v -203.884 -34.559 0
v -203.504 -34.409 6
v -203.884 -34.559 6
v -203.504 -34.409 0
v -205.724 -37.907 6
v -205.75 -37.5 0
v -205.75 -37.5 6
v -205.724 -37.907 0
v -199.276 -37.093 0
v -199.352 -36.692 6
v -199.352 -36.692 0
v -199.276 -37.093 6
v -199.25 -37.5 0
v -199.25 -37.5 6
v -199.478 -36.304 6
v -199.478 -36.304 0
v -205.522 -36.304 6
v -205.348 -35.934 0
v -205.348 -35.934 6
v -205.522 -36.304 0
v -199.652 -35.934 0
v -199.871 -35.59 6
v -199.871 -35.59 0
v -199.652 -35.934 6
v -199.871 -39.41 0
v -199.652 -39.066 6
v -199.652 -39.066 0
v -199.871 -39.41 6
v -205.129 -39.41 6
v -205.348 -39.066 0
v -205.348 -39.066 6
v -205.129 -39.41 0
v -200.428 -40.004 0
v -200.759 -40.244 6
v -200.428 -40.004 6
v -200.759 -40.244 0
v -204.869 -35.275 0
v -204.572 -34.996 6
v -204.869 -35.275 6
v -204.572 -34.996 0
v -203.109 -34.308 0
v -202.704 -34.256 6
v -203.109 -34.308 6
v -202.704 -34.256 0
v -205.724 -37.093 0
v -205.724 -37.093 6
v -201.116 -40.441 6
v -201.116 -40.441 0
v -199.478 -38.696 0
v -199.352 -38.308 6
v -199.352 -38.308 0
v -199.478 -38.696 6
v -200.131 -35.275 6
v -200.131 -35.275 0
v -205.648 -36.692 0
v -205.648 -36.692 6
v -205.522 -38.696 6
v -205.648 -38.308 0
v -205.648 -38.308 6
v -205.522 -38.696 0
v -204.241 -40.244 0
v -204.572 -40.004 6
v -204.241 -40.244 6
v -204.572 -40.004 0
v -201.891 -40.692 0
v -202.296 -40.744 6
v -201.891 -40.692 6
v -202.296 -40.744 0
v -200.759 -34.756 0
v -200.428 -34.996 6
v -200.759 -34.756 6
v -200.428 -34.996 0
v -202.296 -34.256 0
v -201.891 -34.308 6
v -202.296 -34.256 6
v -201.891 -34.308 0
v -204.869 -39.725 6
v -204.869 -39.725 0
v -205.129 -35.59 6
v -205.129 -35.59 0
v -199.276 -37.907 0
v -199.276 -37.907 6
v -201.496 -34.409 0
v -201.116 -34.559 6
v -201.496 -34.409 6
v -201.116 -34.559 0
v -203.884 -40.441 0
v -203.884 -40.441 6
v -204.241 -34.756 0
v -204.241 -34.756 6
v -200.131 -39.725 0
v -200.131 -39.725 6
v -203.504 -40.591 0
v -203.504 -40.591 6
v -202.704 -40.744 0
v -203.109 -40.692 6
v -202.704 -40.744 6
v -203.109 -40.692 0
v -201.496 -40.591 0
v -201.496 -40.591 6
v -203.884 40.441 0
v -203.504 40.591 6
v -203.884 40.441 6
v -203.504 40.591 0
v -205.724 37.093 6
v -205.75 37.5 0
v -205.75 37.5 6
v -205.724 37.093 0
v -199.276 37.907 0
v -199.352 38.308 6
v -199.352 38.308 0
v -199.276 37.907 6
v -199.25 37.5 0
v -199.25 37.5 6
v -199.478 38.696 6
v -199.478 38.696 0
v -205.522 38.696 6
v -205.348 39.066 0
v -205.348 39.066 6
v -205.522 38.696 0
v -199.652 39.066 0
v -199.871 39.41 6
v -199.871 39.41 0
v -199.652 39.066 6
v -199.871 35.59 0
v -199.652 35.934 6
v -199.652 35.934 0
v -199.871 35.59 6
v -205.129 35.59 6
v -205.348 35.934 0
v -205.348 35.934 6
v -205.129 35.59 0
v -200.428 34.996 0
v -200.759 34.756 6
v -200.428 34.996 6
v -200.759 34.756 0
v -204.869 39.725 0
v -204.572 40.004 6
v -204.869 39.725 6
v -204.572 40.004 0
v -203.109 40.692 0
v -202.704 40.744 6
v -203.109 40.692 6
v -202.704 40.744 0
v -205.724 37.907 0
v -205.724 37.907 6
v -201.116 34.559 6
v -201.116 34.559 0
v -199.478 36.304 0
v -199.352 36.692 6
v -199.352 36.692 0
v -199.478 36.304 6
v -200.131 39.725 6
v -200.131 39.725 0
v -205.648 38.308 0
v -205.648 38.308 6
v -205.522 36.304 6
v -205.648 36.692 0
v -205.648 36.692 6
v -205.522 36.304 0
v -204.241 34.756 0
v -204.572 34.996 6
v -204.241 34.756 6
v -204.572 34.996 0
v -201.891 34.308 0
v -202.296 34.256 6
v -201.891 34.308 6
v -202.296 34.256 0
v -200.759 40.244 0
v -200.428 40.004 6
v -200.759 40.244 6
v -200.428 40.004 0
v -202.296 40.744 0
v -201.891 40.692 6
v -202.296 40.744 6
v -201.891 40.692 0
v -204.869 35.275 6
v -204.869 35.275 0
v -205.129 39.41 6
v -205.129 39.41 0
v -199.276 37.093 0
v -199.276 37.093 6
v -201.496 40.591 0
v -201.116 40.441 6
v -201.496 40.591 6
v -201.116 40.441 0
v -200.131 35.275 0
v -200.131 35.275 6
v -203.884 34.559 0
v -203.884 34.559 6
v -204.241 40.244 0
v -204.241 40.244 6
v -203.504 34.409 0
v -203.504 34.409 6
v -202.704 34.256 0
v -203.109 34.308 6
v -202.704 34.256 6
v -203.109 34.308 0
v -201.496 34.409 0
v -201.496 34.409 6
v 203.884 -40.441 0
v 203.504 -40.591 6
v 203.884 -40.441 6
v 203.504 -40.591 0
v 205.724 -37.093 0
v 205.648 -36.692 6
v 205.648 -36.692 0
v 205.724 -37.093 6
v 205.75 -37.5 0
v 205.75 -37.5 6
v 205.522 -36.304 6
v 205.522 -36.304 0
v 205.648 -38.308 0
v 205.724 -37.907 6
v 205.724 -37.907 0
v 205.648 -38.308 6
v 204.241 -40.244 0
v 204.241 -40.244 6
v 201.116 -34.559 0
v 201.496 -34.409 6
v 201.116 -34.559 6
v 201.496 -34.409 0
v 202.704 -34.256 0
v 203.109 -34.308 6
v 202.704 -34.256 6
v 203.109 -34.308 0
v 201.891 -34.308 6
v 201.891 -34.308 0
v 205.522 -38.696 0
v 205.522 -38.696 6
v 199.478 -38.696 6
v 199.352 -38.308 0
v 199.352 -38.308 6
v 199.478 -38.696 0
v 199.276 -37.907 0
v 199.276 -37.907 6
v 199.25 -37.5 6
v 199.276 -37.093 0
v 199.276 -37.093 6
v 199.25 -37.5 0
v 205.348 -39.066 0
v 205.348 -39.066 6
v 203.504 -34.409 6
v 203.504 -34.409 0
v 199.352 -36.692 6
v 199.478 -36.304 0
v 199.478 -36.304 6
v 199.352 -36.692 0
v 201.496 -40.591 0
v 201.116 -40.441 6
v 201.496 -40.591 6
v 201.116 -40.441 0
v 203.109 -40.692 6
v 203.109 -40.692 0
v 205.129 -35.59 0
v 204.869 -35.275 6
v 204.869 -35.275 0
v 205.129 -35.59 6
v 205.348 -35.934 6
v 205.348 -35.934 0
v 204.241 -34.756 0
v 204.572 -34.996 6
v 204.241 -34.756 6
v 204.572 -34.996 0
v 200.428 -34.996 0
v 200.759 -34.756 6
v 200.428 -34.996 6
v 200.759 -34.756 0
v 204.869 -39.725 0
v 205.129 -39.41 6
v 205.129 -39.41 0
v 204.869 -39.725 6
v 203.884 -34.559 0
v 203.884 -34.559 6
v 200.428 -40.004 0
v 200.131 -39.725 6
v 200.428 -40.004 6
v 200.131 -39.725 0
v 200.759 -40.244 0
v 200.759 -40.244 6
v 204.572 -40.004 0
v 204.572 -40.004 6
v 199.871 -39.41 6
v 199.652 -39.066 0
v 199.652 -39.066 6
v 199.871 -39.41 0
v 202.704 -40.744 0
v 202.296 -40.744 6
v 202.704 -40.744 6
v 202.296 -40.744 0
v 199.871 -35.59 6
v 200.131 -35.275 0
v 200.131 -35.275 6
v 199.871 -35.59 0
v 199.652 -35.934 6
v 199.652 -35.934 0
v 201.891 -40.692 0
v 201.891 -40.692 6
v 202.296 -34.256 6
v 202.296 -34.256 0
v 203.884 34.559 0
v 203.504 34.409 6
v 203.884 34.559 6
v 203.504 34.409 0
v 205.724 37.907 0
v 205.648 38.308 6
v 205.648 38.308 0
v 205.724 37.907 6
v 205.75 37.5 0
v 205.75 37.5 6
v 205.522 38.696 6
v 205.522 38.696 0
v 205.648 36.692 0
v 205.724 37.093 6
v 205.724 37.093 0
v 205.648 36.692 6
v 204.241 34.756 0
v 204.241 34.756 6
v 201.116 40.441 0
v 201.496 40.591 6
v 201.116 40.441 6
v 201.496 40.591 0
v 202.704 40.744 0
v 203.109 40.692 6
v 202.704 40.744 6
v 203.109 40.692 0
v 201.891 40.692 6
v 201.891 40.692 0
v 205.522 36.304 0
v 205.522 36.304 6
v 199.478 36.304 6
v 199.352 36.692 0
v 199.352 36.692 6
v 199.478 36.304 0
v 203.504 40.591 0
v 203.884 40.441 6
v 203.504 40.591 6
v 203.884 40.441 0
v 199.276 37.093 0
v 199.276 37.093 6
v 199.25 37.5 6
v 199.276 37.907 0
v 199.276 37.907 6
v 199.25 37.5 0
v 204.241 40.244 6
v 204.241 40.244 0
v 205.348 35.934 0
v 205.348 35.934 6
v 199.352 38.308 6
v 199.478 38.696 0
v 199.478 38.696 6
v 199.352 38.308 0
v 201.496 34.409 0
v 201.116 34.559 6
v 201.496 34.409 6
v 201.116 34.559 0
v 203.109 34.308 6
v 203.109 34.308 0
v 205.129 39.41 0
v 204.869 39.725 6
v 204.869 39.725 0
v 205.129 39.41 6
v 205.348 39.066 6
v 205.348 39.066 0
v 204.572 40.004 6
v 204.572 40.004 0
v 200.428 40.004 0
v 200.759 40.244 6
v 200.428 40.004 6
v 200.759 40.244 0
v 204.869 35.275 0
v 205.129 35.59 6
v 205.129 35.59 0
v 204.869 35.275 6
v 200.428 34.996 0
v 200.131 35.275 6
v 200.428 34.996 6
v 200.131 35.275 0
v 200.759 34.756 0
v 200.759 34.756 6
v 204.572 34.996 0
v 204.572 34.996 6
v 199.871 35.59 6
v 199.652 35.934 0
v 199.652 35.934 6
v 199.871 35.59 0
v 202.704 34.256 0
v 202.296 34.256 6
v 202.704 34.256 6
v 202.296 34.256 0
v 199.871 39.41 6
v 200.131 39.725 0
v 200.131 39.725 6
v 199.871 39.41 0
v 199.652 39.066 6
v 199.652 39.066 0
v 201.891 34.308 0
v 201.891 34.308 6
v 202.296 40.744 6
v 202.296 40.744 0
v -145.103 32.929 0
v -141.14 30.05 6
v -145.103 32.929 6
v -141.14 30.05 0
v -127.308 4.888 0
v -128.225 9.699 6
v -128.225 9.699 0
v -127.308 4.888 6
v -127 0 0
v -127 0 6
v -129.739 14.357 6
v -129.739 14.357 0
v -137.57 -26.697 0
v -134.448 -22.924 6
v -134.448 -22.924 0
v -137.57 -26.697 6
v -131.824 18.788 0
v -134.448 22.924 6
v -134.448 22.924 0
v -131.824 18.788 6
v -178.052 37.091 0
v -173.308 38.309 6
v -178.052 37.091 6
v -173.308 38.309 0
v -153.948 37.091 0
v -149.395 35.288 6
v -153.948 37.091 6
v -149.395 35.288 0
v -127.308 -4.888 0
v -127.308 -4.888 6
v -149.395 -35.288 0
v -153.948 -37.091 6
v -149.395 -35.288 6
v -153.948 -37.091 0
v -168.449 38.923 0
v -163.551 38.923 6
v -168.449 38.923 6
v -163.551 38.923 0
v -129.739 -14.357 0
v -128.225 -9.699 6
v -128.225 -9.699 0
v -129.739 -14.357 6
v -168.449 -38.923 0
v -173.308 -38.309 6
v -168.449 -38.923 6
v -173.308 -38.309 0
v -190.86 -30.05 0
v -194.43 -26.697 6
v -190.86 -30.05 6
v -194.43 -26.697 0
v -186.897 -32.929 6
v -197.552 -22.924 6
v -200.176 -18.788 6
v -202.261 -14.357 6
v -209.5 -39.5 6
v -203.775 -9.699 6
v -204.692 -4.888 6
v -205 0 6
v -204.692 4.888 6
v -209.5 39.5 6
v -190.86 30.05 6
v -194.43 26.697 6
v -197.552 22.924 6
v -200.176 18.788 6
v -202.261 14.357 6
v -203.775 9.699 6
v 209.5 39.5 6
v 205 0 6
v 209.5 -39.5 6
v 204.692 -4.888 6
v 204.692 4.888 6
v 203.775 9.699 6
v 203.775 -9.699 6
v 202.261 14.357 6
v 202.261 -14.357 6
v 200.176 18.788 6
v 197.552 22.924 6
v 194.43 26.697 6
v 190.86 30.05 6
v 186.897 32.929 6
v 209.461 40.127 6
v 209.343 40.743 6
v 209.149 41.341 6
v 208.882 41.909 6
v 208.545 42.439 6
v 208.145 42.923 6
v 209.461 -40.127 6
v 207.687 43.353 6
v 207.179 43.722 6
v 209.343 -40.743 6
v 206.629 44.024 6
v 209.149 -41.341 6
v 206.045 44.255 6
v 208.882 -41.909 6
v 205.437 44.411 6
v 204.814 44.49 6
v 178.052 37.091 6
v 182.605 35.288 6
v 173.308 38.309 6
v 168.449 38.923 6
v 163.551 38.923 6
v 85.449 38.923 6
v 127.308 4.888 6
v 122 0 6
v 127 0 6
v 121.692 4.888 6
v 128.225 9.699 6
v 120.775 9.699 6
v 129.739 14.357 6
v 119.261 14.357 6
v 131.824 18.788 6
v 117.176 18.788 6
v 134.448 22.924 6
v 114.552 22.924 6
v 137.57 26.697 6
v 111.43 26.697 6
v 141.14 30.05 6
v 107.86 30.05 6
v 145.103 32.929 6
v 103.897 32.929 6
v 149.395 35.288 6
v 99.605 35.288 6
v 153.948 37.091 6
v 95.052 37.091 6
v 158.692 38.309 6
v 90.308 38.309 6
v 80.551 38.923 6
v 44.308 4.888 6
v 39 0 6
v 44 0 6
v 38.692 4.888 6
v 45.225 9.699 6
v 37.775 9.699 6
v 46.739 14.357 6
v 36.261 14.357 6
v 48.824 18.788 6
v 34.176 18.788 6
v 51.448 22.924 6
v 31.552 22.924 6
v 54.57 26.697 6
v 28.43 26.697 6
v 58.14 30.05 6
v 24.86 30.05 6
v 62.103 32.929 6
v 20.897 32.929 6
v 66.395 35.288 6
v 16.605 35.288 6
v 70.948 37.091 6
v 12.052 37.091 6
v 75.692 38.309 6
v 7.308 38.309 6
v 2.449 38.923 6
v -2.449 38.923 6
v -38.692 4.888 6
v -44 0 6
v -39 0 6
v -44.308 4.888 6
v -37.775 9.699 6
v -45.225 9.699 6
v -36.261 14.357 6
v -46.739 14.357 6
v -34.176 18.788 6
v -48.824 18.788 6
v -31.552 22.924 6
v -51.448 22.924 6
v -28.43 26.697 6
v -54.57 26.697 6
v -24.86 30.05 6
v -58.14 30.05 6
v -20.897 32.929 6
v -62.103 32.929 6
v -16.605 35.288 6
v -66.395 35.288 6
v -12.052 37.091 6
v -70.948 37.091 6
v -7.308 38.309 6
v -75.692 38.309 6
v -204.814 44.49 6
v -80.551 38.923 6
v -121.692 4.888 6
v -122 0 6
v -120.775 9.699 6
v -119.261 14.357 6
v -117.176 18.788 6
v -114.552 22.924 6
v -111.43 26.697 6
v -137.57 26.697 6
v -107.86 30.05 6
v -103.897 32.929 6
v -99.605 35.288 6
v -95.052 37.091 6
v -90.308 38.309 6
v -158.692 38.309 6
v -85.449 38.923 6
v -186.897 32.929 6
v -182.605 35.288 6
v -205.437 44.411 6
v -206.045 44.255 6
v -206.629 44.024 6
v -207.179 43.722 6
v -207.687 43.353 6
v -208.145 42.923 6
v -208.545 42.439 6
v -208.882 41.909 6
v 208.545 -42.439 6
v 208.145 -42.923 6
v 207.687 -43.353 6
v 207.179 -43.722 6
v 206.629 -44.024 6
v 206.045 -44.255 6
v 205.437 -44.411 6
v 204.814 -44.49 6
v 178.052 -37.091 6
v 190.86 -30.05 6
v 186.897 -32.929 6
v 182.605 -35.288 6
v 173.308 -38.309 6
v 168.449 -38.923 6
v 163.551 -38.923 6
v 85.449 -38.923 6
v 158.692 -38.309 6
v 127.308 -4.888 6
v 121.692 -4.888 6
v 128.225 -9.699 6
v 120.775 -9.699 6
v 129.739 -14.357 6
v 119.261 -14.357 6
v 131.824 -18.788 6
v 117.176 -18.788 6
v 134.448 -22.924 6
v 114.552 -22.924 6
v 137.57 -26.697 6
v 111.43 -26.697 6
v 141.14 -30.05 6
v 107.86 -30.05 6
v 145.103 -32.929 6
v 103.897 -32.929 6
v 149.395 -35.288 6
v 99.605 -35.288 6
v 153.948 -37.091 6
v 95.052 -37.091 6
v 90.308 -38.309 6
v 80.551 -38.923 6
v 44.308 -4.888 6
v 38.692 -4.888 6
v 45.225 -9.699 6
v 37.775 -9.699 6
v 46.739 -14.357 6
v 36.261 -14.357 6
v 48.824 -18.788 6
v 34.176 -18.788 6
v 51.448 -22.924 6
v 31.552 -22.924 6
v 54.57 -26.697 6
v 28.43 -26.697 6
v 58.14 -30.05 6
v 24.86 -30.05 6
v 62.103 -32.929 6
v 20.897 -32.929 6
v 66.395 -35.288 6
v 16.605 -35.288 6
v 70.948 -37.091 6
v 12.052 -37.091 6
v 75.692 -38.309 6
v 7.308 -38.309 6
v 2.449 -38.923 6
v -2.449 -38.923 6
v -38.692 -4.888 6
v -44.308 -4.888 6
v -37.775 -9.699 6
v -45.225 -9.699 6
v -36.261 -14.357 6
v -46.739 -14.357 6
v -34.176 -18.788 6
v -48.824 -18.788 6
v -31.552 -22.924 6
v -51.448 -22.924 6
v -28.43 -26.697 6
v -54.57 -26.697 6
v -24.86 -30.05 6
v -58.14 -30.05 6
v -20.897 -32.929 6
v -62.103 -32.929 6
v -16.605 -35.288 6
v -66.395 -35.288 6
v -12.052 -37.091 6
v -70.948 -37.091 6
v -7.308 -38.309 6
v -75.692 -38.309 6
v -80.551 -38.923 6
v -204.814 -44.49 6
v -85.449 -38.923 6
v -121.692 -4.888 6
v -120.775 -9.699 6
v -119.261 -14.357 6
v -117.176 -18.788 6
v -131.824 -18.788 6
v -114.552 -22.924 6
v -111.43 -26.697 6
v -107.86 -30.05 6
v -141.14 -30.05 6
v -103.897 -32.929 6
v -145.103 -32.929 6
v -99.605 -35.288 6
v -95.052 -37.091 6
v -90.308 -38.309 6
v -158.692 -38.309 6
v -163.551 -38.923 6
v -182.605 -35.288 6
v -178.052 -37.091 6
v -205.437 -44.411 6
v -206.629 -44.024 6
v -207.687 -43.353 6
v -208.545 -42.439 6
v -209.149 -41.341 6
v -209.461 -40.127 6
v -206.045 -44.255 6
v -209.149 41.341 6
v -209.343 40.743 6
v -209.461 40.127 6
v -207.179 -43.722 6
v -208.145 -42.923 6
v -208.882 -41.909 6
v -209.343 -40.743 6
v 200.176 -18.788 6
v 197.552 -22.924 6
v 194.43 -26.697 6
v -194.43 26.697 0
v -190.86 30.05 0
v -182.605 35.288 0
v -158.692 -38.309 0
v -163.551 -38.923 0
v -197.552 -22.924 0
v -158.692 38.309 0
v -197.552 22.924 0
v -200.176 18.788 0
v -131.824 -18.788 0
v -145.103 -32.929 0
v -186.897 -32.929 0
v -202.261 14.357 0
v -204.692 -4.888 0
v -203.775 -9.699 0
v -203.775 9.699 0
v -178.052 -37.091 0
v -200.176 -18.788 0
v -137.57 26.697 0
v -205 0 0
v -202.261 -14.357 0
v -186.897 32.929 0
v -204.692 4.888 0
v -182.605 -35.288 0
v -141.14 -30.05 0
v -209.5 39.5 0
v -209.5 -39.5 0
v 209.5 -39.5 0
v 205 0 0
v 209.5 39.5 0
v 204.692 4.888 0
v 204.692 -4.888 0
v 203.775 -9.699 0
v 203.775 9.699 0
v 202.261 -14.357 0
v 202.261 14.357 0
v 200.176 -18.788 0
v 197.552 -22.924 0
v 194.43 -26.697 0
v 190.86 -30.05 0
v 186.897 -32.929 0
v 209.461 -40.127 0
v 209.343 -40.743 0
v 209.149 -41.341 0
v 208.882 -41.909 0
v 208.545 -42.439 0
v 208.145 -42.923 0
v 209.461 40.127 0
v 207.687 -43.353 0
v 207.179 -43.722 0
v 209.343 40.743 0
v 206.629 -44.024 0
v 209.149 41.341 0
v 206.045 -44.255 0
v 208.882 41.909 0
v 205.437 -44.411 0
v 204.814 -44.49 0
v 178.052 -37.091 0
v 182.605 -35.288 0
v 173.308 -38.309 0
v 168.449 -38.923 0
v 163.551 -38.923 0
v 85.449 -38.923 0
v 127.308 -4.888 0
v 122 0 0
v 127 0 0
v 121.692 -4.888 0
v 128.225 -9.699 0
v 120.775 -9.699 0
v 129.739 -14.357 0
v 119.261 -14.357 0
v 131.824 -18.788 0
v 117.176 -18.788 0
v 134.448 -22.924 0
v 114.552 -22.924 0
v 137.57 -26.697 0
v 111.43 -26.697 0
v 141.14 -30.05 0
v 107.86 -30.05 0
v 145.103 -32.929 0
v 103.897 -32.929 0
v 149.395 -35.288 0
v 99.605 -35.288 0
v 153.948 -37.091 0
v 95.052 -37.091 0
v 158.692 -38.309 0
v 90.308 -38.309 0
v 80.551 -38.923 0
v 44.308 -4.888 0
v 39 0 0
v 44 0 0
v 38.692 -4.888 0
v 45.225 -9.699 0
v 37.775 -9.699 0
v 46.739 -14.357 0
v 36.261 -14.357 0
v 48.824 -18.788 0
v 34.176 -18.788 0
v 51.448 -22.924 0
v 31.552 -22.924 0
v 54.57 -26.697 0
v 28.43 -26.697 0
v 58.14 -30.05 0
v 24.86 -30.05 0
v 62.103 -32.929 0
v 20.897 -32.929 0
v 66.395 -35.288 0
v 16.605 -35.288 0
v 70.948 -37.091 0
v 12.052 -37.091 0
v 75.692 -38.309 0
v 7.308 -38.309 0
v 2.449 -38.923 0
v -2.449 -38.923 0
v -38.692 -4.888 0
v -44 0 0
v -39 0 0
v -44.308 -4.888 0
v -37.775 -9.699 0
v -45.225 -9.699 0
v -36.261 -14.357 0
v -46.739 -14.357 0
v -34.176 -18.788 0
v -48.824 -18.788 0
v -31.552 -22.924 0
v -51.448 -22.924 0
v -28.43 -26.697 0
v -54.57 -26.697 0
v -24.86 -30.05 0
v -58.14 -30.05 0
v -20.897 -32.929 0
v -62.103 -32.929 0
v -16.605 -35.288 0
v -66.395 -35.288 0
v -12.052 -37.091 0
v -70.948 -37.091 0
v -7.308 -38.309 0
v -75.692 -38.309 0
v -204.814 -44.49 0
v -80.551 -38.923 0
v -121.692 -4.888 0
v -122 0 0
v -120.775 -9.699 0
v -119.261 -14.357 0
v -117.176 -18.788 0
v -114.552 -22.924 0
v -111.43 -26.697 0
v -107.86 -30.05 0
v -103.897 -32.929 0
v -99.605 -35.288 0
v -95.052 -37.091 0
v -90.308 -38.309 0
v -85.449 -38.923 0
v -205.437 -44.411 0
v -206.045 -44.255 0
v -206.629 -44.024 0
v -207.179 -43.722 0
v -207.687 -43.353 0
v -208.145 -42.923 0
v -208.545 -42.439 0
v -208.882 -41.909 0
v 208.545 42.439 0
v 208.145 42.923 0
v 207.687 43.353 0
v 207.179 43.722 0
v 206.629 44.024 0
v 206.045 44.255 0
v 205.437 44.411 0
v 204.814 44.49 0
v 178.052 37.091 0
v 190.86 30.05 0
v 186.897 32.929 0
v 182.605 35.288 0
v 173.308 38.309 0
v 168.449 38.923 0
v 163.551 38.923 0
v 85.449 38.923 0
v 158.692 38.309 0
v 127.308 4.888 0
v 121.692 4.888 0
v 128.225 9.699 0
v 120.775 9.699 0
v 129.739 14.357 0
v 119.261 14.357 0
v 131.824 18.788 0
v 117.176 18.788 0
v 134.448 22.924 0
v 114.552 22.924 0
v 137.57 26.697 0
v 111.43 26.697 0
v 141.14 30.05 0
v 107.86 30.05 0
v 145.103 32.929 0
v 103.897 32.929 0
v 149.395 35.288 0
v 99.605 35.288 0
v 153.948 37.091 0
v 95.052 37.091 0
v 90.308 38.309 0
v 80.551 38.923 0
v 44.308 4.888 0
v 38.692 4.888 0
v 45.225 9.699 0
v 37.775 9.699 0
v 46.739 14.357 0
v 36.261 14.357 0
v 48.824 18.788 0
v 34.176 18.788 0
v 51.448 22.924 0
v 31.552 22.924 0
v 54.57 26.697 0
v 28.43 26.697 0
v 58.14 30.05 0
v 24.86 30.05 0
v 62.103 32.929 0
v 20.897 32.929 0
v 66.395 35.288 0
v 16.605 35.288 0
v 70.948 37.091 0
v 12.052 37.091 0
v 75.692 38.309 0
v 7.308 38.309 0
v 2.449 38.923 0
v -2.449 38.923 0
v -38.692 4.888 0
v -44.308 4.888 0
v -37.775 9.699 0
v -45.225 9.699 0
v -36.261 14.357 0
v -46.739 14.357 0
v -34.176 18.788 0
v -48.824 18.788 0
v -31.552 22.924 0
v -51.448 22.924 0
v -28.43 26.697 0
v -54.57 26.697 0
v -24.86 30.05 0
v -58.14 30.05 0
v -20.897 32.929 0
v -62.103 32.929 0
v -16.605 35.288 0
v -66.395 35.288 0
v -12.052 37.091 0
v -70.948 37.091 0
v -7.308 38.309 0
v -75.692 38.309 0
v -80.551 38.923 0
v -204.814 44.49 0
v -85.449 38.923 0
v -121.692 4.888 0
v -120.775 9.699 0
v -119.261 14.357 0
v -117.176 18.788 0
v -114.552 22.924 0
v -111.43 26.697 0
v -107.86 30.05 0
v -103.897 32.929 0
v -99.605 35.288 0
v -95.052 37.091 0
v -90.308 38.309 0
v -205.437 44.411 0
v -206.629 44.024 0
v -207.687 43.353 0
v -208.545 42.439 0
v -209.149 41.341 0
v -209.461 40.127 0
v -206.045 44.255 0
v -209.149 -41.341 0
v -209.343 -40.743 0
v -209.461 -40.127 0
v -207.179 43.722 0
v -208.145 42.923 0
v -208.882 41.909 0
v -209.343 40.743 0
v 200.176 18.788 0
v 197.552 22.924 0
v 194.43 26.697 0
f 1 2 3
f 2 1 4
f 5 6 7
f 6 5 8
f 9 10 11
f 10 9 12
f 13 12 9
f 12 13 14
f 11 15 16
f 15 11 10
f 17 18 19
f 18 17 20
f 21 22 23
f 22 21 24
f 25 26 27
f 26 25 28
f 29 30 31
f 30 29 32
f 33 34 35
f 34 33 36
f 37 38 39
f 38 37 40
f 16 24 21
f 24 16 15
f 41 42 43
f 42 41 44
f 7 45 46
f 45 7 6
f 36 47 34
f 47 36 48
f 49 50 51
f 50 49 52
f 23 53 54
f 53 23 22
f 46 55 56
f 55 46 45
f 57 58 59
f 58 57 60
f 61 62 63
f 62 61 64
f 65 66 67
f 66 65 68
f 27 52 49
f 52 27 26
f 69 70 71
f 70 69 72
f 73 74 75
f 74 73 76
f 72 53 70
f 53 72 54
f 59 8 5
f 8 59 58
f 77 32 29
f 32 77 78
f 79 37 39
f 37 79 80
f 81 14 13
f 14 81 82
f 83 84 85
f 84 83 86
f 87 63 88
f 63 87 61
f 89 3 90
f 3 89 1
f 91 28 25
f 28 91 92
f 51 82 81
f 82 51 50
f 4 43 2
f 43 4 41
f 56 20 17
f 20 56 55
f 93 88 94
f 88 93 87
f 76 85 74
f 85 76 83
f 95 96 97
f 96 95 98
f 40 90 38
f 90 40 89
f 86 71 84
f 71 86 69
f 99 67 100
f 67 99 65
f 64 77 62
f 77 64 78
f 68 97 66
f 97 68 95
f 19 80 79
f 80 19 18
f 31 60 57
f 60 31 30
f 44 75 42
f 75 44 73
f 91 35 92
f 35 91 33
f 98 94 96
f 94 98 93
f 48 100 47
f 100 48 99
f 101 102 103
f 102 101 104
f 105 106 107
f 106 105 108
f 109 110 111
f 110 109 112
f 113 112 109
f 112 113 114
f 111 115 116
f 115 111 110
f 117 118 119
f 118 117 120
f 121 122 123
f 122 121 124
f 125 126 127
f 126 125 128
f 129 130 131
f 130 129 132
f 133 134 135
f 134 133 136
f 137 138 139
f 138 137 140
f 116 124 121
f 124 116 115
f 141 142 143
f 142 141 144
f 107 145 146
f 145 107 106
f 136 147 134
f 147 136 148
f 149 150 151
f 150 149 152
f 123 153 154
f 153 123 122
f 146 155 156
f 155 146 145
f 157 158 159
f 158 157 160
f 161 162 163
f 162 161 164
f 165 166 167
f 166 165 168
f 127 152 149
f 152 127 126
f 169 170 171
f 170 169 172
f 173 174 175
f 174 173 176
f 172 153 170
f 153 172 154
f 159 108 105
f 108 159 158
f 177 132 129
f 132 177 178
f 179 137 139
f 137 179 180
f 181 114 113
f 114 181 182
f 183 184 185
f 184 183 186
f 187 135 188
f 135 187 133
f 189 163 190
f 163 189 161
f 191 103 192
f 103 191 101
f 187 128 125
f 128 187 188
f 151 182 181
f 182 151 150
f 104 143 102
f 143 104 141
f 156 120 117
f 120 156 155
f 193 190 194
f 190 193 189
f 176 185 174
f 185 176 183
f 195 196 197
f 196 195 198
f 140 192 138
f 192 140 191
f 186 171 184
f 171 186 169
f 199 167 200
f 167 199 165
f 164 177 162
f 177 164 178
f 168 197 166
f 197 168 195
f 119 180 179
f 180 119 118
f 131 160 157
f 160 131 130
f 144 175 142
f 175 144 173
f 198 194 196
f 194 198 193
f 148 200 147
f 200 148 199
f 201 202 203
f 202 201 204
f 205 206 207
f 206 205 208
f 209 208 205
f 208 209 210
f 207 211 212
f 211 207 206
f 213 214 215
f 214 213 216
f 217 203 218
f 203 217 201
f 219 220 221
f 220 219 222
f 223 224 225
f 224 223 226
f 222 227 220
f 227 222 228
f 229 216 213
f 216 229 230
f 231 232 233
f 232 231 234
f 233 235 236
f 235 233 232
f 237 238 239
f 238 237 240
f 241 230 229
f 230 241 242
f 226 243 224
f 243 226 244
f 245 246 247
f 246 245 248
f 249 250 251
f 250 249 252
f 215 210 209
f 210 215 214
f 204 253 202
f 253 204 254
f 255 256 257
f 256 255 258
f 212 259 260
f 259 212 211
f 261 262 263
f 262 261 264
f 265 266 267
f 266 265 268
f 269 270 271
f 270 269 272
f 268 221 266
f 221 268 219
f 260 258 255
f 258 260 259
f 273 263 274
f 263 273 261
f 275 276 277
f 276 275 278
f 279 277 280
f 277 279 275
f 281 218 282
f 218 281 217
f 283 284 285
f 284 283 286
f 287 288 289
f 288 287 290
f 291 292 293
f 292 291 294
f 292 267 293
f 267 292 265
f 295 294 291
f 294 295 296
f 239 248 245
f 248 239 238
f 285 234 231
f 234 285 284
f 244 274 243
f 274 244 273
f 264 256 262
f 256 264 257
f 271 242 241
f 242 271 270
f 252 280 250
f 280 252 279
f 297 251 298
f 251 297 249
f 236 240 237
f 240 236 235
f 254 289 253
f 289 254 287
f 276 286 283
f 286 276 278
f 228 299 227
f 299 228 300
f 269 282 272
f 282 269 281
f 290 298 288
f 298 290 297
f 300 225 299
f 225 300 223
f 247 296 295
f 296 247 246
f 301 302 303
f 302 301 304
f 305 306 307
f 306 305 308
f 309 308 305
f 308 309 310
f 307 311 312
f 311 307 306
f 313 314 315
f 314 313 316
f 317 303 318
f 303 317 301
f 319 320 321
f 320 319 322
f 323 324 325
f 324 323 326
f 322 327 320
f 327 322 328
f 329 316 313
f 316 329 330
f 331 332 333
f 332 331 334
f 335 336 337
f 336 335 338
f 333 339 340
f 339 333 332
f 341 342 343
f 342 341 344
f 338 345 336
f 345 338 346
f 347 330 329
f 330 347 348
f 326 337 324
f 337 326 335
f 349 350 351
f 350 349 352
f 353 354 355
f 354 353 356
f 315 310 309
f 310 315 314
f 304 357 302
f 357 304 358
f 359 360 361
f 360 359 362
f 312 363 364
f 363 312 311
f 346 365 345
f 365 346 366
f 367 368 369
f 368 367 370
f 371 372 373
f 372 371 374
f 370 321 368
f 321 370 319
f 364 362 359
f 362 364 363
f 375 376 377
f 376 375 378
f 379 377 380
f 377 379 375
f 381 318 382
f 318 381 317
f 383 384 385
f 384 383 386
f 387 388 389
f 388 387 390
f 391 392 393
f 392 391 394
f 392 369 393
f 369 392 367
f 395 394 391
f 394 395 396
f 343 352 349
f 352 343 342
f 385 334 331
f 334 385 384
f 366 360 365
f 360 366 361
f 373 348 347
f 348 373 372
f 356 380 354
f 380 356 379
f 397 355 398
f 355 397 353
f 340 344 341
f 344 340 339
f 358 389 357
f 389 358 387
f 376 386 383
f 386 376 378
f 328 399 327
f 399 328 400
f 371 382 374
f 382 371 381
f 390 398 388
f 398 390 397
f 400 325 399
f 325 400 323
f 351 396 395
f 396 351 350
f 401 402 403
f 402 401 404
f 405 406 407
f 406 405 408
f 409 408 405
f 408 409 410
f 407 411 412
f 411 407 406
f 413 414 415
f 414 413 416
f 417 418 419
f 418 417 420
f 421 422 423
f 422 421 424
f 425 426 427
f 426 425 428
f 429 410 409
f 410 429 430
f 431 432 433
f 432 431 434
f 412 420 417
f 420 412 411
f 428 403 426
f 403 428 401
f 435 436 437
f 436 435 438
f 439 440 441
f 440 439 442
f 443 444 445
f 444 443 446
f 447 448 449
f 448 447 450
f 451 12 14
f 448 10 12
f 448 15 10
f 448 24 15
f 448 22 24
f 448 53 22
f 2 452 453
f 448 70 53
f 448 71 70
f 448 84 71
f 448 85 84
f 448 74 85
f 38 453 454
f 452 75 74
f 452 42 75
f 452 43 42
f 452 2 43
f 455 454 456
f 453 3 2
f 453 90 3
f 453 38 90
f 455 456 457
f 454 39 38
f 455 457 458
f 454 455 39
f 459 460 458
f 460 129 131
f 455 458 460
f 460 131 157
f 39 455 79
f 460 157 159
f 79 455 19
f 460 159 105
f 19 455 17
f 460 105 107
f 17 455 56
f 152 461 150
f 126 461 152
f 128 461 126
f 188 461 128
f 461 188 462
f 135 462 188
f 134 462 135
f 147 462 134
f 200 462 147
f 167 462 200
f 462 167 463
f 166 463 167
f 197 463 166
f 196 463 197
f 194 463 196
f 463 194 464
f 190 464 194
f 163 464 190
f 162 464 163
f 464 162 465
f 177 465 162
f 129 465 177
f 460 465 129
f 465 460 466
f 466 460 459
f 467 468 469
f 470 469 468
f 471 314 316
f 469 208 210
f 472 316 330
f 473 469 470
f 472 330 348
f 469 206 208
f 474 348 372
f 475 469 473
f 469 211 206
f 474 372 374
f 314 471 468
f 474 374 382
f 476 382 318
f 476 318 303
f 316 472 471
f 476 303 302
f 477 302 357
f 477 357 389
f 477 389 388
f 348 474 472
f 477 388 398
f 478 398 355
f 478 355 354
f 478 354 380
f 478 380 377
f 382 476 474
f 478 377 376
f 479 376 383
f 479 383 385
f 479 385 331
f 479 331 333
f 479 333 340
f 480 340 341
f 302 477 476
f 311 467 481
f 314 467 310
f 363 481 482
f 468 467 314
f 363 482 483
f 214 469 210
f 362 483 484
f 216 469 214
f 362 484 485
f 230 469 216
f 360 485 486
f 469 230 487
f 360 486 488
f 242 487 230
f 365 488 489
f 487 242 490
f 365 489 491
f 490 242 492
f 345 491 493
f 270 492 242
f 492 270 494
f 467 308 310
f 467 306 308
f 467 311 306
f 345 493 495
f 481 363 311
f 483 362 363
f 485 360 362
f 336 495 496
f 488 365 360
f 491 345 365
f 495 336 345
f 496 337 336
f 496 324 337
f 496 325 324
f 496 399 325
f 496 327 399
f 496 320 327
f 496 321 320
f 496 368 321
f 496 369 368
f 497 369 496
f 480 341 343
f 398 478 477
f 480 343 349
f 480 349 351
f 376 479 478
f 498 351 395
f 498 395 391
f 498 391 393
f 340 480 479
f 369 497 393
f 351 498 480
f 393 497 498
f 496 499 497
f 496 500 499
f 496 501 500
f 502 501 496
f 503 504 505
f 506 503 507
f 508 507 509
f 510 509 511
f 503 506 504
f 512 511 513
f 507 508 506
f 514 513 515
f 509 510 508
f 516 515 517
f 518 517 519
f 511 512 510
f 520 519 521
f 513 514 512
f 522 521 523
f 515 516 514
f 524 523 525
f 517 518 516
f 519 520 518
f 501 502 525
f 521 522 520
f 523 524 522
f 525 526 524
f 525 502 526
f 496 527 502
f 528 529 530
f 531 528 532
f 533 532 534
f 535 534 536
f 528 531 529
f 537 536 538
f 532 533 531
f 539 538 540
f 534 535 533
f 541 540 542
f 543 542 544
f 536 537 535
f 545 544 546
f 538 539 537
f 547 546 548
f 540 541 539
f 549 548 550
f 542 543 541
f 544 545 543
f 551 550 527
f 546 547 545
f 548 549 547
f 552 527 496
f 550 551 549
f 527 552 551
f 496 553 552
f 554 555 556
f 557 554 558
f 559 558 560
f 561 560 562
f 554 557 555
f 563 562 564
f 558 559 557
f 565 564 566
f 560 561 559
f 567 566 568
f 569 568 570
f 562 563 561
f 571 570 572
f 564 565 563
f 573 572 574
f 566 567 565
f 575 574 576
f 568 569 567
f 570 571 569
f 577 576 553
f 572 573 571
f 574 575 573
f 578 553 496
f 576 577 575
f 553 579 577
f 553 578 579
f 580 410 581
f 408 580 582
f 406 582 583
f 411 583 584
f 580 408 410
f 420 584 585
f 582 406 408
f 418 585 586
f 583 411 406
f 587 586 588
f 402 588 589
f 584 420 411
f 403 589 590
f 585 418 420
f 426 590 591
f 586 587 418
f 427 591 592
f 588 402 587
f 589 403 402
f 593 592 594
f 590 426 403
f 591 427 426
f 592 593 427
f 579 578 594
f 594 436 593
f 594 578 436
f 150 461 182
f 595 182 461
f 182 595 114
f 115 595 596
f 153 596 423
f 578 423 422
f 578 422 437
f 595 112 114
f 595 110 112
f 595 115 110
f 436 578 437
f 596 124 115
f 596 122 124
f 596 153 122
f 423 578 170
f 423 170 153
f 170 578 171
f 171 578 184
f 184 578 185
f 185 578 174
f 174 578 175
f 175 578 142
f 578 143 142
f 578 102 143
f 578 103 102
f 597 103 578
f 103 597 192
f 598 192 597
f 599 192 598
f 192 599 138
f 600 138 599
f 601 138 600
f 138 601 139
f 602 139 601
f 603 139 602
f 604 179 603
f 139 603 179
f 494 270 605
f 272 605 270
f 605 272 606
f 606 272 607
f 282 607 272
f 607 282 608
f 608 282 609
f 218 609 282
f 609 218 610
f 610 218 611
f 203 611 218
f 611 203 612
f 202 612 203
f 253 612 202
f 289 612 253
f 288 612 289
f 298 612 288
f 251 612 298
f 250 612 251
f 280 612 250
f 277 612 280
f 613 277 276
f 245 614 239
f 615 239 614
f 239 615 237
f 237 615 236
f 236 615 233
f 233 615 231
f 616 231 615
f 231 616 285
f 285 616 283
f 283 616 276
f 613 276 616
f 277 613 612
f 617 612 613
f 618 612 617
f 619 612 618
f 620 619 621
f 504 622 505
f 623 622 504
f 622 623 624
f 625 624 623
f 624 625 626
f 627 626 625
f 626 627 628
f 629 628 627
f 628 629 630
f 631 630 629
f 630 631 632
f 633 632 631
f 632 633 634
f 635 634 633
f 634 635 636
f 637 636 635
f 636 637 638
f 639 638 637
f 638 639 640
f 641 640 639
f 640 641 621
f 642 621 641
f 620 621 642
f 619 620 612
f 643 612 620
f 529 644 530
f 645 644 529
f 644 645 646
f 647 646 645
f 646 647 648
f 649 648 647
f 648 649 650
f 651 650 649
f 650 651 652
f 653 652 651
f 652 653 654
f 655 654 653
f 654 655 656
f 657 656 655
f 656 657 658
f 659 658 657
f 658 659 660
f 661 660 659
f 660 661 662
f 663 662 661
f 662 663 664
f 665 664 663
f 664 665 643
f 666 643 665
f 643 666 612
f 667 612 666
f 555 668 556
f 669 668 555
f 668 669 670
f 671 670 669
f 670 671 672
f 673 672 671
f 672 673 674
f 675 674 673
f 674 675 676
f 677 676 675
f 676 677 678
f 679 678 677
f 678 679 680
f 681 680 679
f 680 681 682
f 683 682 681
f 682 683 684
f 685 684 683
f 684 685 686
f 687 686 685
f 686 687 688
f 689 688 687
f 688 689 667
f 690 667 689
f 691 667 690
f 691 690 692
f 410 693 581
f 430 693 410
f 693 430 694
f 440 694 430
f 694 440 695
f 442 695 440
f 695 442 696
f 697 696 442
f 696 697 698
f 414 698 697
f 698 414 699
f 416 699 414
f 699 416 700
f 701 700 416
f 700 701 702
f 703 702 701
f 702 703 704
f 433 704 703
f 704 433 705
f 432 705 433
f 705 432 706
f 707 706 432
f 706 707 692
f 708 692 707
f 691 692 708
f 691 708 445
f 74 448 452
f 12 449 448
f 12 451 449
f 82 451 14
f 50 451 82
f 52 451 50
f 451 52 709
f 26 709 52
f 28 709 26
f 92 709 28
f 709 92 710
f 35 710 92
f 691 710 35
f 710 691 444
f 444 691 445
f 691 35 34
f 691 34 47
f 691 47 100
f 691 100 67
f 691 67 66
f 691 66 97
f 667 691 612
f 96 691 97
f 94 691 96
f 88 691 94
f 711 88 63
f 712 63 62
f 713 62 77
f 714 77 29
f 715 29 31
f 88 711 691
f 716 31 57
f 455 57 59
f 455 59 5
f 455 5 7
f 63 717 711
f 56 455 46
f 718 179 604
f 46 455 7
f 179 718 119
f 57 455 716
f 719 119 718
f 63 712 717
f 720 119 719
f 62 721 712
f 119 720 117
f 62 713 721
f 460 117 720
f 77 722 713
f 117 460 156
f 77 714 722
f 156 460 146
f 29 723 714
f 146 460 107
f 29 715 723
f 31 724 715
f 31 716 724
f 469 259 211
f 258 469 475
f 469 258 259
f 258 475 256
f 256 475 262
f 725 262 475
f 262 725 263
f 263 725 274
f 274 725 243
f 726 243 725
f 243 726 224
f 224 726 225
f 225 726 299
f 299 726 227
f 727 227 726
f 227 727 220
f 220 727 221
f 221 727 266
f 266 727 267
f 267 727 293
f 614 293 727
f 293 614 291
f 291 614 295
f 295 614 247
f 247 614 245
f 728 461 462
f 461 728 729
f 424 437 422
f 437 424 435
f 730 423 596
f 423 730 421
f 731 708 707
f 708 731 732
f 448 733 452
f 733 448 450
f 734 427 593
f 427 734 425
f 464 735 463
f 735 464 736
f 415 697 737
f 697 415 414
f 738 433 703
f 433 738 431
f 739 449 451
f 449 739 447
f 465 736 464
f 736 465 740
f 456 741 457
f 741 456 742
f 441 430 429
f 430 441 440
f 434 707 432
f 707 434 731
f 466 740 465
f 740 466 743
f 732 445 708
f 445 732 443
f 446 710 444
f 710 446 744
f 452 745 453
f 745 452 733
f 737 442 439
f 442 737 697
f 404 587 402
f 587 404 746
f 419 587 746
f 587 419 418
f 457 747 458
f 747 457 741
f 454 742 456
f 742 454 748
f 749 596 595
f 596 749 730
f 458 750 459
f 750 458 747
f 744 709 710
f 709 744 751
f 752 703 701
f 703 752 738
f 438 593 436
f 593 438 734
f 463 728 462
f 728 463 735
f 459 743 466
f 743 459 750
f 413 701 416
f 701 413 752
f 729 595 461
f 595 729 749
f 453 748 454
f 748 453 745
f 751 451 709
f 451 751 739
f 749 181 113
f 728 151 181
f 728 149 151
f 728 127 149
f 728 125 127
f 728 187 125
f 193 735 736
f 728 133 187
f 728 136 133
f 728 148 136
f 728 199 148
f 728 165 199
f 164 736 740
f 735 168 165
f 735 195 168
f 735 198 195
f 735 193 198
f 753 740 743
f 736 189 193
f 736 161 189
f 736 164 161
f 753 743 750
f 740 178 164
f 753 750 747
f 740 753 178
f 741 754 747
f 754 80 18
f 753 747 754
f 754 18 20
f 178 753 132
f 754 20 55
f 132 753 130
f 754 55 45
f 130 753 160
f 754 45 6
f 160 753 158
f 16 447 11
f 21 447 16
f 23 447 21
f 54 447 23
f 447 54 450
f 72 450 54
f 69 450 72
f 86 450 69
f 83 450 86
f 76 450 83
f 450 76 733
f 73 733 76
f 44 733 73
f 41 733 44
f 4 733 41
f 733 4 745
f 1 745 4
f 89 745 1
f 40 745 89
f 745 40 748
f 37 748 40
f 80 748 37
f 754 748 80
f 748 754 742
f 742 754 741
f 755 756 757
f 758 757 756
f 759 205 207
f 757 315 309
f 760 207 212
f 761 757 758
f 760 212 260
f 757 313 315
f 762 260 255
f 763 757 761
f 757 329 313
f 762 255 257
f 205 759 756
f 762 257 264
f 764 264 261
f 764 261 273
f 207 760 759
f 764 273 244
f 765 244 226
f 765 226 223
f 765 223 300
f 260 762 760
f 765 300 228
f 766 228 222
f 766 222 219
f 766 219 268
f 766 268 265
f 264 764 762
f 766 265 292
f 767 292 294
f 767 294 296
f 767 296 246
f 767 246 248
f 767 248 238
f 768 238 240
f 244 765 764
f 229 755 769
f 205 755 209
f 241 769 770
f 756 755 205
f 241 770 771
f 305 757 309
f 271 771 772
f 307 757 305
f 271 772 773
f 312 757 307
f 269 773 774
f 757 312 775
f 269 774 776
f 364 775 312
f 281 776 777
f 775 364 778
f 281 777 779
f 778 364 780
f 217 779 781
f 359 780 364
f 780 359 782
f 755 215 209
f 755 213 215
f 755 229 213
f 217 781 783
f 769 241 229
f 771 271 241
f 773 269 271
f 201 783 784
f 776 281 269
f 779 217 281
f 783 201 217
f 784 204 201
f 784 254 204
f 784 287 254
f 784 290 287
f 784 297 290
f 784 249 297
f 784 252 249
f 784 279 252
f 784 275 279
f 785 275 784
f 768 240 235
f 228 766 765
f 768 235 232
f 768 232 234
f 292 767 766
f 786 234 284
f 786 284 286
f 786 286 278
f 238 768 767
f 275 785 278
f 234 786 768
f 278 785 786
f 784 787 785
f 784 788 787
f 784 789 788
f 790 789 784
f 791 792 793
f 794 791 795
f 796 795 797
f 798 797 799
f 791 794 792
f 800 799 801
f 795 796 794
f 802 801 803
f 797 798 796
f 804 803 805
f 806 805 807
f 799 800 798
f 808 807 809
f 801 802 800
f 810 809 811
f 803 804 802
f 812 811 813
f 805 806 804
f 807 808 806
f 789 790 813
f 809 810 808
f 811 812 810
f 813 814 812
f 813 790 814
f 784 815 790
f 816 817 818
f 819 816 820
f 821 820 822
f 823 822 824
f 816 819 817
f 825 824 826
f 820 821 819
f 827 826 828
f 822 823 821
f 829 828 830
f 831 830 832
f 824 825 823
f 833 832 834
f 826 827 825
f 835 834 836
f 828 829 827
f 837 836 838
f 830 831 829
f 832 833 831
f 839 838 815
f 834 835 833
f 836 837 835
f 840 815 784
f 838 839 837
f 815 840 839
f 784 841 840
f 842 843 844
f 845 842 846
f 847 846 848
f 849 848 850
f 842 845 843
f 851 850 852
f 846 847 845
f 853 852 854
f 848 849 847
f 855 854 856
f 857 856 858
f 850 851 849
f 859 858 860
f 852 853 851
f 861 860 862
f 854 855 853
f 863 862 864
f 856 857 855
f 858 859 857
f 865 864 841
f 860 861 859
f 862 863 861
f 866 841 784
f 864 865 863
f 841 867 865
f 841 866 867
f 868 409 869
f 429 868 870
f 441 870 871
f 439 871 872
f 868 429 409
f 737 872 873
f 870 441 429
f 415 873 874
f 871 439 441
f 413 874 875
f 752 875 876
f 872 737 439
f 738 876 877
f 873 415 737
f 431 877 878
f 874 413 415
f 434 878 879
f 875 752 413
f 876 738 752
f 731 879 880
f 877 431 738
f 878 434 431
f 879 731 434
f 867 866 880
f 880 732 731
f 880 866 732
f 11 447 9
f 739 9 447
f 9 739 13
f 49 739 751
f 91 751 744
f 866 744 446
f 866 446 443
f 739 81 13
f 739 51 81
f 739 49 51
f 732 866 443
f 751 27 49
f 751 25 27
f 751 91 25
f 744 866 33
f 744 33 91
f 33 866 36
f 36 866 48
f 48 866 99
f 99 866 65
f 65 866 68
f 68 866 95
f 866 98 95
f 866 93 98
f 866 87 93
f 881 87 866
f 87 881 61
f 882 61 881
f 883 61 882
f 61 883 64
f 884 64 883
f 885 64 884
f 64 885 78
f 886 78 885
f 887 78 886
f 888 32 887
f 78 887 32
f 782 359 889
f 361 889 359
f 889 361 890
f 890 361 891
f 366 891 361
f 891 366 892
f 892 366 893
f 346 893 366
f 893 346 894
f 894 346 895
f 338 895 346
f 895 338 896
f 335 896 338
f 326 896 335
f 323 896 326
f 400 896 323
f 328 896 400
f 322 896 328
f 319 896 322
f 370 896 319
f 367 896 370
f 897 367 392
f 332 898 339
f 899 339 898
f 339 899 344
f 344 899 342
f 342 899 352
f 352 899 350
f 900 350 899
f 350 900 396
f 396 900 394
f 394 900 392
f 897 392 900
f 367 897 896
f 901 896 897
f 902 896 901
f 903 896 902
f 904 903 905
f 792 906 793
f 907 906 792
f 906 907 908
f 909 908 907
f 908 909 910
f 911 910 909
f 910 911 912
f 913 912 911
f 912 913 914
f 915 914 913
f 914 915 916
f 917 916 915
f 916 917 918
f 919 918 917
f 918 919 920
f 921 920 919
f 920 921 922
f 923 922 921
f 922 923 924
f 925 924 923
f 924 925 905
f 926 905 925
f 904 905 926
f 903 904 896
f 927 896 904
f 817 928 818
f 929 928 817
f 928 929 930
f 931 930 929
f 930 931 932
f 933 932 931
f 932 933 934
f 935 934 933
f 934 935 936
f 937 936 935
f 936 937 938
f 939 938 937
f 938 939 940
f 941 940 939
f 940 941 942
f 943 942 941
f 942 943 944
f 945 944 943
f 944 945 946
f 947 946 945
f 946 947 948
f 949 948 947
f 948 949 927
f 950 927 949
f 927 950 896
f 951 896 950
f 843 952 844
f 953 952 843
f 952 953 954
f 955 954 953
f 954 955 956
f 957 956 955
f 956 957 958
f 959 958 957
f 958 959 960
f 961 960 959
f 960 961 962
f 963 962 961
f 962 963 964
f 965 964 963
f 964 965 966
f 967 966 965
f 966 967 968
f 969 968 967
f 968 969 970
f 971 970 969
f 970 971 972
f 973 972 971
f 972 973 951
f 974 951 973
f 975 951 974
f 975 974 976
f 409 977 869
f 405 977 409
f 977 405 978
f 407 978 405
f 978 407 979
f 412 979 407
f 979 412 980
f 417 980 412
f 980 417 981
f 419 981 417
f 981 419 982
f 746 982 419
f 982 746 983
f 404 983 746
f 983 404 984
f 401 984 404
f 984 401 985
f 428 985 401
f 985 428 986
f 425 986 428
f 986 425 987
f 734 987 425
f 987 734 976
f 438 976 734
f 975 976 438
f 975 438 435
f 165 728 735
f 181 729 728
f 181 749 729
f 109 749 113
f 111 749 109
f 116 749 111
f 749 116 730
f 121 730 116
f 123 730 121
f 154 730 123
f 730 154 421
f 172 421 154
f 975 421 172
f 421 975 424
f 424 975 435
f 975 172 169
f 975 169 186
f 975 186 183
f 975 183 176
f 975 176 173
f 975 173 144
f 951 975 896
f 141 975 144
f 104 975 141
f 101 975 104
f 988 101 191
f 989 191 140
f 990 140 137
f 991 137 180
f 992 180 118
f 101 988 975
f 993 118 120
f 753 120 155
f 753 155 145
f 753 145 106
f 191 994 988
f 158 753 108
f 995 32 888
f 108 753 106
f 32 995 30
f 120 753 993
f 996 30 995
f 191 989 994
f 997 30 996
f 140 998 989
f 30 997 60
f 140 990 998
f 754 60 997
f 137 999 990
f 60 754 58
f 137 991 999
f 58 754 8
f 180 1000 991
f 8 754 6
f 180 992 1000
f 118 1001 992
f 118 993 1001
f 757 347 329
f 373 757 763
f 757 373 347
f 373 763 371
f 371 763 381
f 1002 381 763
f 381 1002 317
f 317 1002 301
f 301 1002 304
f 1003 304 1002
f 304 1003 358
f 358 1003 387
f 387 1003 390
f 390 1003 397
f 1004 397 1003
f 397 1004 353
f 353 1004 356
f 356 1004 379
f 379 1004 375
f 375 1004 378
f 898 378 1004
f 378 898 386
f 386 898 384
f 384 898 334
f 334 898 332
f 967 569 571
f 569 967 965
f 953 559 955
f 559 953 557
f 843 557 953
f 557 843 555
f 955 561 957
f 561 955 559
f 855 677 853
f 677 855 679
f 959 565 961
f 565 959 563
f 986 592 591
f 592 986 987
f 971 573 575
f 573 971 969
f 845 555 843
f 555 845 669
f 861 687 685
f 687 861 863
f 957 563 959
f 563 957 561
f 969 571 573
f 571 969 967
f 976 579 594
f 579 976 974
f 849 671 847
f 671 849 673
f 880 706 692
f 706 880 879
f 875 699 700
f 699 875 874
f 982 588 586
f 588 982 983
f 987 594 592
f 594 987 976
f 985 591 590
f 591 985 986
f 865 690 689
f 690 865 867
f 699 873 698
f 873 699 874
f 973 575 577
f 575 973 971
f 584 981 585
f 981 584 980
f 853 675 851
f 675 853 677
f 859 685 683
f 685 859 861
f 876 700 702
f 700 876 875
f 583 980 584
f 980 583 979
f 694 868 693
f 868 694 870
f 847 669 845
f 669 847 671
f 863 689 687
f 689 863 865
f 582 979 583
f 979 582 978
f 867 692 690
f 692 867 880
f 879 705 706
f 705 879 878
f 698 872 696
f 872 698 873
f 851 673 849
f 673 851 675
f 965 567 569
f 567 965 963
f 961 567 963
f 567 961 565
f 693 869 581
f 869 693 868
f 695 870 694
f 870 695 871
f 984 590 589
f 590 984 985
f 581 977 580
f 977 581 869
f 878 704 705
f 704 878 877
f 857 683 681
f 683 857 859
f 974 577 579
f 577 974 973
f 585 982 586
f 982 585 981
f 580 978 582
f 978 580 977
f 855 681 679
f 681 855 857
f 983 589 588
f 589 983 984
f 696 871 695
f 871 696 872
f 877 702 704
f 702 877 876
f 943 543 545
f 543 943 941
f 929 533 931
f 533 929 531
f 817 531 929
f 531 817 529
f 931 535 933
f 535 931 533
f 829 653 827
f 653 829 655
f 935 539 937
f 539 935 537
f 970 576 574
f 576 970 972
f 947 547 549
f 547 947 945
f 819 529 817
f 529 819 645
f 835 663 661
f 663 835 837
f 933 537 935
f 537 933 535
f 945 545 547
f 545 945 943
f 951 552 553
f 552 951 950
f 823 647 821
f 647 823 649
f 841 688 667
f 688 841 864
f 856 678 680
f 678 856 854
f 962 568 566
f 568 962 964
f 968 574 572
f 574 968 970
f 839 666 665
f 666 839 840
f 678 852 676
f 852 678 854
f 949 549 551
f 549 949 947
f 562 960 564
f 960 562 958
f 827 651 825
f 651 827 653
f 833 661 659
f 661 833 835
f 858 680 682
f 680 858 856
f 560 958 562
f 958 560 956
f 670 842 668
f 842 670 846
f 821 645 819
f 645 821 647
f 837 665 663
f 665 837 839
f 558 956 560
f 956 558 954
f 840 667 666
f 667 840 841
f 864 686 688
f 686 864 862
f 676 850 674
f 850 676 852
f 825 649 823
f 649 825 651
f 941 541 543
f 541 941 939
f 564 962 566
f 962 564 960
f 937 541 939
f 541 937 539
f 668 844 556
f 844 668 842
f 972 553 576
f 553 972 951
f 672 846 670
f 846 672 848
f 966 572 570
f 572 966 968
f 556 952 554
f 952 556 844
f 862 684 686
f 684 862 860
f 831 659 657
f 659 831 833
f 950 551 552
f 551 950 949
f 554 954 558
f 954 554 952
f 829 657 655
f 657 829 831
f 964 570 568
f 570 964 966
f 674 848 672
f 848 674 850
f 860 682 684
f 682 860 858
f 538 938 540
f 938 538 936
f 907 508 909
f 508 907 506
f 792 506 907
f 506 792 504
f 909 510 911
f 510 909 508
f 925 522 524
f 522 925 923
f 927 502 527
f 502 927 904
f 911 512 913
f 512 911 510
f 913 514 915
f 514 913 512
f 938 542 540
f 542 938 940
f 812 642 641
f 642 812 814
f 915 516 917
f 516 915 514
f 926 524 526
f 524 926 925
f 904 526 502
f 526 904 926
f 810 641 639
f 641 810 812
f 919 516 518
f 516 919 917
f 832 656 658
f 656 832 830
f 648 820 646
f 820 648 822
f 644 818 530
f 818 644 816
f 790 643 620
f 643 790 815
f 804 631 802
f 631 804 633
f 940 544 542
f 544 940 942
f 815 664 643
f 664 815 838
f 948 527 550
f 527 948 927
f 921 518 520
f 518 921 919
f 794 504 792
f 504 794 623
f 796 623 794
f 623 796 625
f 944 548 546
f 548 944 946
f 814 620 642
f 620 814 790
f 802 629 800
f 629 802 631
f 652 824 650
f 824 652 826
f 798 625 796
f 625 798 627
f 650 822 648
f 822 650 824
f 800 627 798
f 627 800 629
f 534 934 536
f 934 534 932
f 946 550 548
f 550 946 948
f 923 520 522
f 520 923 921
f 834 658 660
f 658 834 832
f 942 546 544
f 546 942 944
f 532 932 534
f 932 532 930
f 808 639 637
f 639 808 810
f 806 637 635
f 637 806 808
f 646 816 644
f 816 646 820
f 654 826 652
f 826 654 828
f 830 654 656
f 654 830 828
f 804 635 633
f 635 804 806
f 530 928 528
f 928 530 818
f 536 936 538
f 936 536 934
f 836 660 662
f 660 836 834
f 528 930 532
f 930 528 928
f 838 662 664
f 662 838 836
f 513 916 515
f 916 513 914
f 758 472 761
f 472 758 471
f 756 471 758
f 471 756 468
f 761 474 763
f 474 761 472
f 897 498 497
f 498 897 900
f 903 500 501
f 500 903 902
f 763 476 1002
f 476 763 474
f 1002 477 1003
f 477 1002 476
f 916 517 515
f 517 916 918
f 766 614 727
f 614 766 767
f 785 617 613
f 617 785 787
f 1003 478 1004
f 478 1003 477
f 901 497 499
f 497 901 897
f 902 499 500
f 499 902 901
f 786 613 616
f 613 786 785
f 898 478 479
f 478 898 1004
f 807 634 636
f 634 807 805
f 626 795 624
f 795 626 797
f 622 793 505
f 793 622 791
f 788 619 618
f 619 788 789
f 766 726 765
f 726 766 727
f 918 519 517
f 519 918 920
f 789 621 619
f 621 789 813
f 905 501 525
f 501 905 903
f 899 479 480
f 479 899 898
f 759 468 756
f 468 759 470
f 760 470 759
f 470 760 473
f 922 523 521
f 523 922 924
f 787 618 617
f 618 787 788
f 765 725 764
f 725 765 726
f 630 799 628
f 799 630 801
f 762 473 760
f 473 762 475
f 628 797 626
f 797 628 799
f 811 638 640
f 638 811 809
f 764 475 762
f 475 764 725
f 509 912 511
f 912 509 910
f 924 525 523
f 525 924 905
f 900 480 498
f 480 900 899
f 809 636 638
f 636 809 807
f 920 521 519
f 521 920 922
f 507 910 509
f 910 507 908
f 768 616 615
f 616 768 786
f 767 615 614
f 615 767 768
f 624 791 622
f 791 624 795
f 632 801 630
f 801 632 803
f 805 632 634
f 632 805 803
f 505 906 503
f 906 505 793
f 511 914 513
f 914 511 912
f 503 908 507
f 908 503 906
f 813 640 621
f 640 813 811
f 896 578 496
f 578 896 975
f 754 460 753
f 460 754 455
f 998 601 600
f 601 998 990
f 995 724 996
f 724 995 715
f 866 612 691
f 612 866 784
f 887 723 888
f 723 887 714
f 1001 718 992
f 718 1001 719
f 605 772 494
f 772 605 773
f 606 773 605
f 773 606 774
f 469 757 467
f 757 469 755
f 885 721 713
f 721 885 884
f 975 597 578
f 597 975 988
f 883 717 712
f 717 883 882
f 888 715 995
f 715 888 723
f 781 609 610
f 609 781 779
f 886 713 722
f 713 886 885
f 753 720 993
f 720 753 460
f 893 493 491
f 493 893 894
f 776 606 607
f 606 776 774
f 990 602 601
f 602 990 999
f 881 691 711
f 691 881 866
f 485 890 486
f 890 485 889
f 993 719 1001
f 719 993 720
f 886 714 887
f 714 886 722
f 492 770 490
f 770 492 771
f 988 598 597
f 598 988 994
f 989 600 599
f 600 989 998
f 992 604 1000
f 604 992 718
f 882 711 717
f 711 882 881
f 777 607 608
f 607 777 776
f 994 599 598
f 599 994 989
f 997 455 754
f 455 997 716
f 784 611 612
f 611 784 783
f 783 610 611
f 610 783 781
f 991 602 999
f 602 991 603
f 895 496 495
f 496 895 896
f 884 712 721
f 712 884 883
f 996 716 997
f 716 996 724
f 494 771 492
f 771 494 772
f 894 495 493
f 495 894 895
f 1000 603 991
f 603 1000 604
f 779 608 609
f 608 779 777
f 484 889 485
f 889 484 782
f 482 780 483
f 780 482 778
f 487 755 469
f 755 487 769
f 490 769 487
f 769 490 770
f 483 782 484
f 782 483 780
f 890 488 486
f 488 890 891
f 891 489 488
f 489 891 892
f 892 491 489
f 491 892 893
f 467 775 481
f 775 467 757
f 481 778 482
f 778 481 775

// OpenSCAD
$fn = 50;


difference() {
	union() {
		hull() {
			translate(v = [-204.5000000000, 39.5000000000, 0]) {
				cylinder(h = 6, r = 5);
			}
			translate(v = [204.5000000000, 39.5000000000, 0]) {
				cylinder(h = 6, r = 5);
			}
			translate(v = [-204.5000000000, -39.5000000000, 0]) {
				cylinder(h = 6, r = 5);
			}
			translate(v = [204.5000000000, -39.5000000000, 0]) {
				cylinder(h = 6, r = 5);
			}
		}
	}
	union() {
		#translate(v = [-202.5000000000, -37.5000000000, -100.0000000000]) {
			cylinder(h = 200, r = 3.2500000000);
		}
		#translate(v = [-202.5000000000, 37.5000000000, -100.0000000000]) {
			cylinder(h = 200, r = 3.2500000000);
		}
		#translate(v = [202.5000000000, -37.5000000000, -100.0000000000]) {
			cylinder(h = 200, r = 3.2500000000);
		}
		#translate(v = [202.5000000000, 37.5000000000, -100.0000000000]) {
			cylinder(h = 200, r = 3.2500000000);
		}
		#translate(v = [-166.0000000000, 0, 0]) {
			cylinder(h = 6, r = 39.0000000000);
		}
		#translate(v = [-83.0000000000, 0, 0]) {
			cylinder(h = 6, r = 39.0000000000);
		}
		#cylinder(h = 6, r = 39.0000000000);
		#translate(v = [83.0000000000, 0, 0]) {
			cylinder(h = 6, r = 39.0000000000);
		}
		#translate(v = [166.0000000000, 0, 0]) {
			cylinder(h = 6, r = 39.0000000000);
		}
	}
}
